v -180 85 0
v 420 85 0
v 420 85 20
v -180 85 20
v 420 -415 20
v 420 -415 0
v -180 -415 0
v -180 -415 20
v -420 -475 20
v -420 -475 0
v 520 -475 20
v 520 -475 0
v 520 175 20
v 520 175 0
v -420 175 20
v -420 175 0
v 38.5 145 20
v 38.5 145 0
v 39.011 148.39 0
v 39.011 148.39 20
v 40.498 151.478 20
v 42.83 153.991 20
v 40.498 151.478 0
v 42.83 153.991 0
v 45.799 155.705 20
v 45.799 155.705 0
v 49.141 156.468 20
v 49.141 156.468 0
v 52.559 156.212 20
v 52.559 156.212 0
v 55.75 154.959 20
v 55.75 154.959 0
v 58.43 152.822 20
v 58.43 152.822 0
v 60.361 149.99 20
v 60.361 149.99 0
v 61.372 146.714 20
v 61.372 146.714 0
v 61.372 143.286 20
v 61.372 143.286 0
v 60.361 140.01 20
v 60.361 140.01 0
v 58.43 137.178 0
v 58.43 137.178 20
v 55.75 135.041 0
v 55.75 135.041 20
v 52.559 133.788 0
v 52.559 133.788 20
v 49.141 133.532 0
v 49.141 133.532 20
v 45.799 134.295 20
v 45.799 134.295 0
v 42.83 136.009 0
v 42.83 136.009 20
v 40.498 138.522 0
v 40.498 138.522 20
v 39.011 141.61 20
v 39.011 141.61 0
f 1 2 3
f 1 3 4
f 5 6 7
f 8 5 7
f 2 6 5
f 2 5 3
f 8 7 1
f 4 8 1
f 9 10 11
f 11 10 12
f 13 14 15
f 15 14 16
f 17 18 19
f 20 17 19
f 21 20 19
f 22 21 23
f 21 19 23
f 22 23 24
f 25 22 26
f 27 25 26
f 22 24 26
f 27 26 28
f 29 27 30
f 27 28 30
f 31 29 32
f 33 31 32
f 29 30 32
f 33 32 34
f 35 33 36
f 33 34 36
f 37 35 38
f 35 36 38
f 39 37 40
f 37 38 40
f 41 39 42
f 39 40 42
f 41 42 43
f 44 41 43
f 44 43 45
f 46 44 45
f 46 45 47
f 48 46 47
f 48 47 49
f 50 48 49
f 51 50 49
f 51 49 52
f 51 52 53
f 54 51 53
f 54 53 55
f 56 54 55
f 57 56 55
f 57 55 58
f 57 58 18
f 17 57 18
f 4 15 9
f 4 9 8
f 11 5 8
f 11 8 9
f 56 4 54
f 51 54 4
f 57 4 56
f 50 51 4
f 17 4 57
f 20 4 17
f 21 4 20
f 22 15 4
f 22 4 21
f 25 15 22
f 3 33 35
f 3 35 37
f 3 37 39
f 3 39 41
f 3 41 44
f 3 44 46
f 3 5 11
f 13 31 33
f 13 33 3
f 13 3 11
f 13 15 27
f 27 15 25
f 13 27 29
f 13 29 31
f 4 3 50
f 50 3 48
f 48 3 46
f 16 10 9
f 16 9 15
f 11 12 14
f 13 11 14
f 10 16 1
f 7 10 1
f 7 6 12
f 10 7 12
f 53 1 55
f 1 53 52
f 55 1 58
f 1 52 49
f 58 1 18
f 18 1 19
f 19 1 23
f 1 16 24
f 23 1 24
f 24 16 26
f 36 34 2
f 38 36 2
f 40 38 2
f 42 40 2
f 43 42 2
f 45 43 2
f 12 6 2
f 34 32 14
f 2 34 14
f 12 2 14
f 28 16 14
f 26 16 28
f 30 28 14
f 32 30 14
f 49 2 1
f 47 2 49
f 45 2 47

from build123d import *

# Parameters (mm, degrees)
CROQUIS1_W              = 1200
CROQUIS1_H              = 950
SALIENTE_EXTRUIR1_DEPTH = 20
CROQUIS2_W              = 150
CROQUIS2_H              = 180
CORTAR_EXTRUIR1_DEPTH   = 20
CROQUIS3_W              = 600
CROQUIS3_H              = 500
CORTAR_EXTRUIR2_DEPTH   = 20
CROQUIS5_W              = 1200
CROQUIS5_H              = 300
CORTAR_EXTRUIR4_DEPTH   = 40
CROQUIS4_R              = 11.5
CORTAR_EXTRUIR5_DEPTH   = 40
CROQUIS6_W              = 80
CROQUIS6_H              = 650
CROQUIS6_W_2            = 178
CORTAR_EXTRUIR6_DEPTH   = 30
CROQUIS7_W              = 2
CROQUIS7_H              = 650
CORTAR_EXTRUIR7_DEPTH   = 30


with BuildPart() as part:
    # Croquis1 → Saliente-Extruir1 (new body)
    with BuildSketch(Plane.XY):
        Rectangle(CROQUIS1_W, CROQUIS1_H)
    extrude(amount=SALIENTE_EXTRUIR1_DEPTH)

    # Croquis2 → Cortar-Extruir1 (cut)
    with BuildSketch(Plane.XY.offset(20)):
        with Locations((-200, 355)):
            Rectangle(CROQUIS2_W, CROQUIS2_H)
    extrude(amount=-CORTAR_EXTRUIR1_DEPTH, mode=Mode.SUBTRACT)

    # Croquis3 → Cortar-Extruir2 (cut)
    with BuildSketch(Plane(origin=(0, 0, 0), x_dir=(-1, 0, 0), z_dir=(0, 0, -1))):
        with Locations((-120, -165)):
            Rectangle(CROQUIS3_W, CROQUIS3_H)
    extrude(amount=-CORTAR_EXTRUIR2_DEPTH, mode=Mode.SUBTRACT)

    # Croquis5 → Cortar-Extruir4 (cut)
    with BuildSketch(Plane(origin=(0, 0, 0), x_dir=(-1, 0, 0), z_dir=(0, 0, -1))):
        with Locations((0, 325)):
            Rectangle(CROQUIS5_W, CROQUIS5_H)
    extrude(amount=-CORTAR_EXTRUIR4_DEPTH, mode=Mode.SUBTRACT)

    # Croquis4 → Cortar-Extruir5 (cut)
    with BuildSketch(Plane(origin=(0, 0, 0), x_dir=(-1, 0, 0), z_dir=(0, 0, -1))):
        with Locations((-50, 145)):
            Circle(CROQUIS4_R)
    extrude(amount=-CORTAR_EXTRUIR5_DEPTH, mode=Mode.SUBTRACT)

    # Croquis6 → Cortar-Extruir6 (cut)
    with BuildSketch(Plane(origin=(0, 0, 0), x_dir=(-1, 0, 0), z_dir=(0, 0, -1))):
        with Locations((-560, -150)):
            Rectangle(CROQUIS6_W, CROQUIS6_H)
        with Locations((511, -150)):
            Rectangle(CROQUIS6_W_2, CROQUIS6_H)
    extrude(amount=-CORTAR_EXTRUIR6_DEPTH, mode=Mode.SUBTRACT)

    # Croquis7 → Cortar-Extruir7 (cut)
    with BuildSketch(Plane(origin=(0, 0, 0), x_dir=(-1, 0, 0), z_dir=(0, 0, -1))):
        with Locations((421, -150)):
            Rectangle(CROQUIS7_W, CROQUIS7_H)
    extrude(amount=-CORTAR_EXTRUIR7_DEPTH, mode=Mode.SUBTRACT)


solid = part.part
